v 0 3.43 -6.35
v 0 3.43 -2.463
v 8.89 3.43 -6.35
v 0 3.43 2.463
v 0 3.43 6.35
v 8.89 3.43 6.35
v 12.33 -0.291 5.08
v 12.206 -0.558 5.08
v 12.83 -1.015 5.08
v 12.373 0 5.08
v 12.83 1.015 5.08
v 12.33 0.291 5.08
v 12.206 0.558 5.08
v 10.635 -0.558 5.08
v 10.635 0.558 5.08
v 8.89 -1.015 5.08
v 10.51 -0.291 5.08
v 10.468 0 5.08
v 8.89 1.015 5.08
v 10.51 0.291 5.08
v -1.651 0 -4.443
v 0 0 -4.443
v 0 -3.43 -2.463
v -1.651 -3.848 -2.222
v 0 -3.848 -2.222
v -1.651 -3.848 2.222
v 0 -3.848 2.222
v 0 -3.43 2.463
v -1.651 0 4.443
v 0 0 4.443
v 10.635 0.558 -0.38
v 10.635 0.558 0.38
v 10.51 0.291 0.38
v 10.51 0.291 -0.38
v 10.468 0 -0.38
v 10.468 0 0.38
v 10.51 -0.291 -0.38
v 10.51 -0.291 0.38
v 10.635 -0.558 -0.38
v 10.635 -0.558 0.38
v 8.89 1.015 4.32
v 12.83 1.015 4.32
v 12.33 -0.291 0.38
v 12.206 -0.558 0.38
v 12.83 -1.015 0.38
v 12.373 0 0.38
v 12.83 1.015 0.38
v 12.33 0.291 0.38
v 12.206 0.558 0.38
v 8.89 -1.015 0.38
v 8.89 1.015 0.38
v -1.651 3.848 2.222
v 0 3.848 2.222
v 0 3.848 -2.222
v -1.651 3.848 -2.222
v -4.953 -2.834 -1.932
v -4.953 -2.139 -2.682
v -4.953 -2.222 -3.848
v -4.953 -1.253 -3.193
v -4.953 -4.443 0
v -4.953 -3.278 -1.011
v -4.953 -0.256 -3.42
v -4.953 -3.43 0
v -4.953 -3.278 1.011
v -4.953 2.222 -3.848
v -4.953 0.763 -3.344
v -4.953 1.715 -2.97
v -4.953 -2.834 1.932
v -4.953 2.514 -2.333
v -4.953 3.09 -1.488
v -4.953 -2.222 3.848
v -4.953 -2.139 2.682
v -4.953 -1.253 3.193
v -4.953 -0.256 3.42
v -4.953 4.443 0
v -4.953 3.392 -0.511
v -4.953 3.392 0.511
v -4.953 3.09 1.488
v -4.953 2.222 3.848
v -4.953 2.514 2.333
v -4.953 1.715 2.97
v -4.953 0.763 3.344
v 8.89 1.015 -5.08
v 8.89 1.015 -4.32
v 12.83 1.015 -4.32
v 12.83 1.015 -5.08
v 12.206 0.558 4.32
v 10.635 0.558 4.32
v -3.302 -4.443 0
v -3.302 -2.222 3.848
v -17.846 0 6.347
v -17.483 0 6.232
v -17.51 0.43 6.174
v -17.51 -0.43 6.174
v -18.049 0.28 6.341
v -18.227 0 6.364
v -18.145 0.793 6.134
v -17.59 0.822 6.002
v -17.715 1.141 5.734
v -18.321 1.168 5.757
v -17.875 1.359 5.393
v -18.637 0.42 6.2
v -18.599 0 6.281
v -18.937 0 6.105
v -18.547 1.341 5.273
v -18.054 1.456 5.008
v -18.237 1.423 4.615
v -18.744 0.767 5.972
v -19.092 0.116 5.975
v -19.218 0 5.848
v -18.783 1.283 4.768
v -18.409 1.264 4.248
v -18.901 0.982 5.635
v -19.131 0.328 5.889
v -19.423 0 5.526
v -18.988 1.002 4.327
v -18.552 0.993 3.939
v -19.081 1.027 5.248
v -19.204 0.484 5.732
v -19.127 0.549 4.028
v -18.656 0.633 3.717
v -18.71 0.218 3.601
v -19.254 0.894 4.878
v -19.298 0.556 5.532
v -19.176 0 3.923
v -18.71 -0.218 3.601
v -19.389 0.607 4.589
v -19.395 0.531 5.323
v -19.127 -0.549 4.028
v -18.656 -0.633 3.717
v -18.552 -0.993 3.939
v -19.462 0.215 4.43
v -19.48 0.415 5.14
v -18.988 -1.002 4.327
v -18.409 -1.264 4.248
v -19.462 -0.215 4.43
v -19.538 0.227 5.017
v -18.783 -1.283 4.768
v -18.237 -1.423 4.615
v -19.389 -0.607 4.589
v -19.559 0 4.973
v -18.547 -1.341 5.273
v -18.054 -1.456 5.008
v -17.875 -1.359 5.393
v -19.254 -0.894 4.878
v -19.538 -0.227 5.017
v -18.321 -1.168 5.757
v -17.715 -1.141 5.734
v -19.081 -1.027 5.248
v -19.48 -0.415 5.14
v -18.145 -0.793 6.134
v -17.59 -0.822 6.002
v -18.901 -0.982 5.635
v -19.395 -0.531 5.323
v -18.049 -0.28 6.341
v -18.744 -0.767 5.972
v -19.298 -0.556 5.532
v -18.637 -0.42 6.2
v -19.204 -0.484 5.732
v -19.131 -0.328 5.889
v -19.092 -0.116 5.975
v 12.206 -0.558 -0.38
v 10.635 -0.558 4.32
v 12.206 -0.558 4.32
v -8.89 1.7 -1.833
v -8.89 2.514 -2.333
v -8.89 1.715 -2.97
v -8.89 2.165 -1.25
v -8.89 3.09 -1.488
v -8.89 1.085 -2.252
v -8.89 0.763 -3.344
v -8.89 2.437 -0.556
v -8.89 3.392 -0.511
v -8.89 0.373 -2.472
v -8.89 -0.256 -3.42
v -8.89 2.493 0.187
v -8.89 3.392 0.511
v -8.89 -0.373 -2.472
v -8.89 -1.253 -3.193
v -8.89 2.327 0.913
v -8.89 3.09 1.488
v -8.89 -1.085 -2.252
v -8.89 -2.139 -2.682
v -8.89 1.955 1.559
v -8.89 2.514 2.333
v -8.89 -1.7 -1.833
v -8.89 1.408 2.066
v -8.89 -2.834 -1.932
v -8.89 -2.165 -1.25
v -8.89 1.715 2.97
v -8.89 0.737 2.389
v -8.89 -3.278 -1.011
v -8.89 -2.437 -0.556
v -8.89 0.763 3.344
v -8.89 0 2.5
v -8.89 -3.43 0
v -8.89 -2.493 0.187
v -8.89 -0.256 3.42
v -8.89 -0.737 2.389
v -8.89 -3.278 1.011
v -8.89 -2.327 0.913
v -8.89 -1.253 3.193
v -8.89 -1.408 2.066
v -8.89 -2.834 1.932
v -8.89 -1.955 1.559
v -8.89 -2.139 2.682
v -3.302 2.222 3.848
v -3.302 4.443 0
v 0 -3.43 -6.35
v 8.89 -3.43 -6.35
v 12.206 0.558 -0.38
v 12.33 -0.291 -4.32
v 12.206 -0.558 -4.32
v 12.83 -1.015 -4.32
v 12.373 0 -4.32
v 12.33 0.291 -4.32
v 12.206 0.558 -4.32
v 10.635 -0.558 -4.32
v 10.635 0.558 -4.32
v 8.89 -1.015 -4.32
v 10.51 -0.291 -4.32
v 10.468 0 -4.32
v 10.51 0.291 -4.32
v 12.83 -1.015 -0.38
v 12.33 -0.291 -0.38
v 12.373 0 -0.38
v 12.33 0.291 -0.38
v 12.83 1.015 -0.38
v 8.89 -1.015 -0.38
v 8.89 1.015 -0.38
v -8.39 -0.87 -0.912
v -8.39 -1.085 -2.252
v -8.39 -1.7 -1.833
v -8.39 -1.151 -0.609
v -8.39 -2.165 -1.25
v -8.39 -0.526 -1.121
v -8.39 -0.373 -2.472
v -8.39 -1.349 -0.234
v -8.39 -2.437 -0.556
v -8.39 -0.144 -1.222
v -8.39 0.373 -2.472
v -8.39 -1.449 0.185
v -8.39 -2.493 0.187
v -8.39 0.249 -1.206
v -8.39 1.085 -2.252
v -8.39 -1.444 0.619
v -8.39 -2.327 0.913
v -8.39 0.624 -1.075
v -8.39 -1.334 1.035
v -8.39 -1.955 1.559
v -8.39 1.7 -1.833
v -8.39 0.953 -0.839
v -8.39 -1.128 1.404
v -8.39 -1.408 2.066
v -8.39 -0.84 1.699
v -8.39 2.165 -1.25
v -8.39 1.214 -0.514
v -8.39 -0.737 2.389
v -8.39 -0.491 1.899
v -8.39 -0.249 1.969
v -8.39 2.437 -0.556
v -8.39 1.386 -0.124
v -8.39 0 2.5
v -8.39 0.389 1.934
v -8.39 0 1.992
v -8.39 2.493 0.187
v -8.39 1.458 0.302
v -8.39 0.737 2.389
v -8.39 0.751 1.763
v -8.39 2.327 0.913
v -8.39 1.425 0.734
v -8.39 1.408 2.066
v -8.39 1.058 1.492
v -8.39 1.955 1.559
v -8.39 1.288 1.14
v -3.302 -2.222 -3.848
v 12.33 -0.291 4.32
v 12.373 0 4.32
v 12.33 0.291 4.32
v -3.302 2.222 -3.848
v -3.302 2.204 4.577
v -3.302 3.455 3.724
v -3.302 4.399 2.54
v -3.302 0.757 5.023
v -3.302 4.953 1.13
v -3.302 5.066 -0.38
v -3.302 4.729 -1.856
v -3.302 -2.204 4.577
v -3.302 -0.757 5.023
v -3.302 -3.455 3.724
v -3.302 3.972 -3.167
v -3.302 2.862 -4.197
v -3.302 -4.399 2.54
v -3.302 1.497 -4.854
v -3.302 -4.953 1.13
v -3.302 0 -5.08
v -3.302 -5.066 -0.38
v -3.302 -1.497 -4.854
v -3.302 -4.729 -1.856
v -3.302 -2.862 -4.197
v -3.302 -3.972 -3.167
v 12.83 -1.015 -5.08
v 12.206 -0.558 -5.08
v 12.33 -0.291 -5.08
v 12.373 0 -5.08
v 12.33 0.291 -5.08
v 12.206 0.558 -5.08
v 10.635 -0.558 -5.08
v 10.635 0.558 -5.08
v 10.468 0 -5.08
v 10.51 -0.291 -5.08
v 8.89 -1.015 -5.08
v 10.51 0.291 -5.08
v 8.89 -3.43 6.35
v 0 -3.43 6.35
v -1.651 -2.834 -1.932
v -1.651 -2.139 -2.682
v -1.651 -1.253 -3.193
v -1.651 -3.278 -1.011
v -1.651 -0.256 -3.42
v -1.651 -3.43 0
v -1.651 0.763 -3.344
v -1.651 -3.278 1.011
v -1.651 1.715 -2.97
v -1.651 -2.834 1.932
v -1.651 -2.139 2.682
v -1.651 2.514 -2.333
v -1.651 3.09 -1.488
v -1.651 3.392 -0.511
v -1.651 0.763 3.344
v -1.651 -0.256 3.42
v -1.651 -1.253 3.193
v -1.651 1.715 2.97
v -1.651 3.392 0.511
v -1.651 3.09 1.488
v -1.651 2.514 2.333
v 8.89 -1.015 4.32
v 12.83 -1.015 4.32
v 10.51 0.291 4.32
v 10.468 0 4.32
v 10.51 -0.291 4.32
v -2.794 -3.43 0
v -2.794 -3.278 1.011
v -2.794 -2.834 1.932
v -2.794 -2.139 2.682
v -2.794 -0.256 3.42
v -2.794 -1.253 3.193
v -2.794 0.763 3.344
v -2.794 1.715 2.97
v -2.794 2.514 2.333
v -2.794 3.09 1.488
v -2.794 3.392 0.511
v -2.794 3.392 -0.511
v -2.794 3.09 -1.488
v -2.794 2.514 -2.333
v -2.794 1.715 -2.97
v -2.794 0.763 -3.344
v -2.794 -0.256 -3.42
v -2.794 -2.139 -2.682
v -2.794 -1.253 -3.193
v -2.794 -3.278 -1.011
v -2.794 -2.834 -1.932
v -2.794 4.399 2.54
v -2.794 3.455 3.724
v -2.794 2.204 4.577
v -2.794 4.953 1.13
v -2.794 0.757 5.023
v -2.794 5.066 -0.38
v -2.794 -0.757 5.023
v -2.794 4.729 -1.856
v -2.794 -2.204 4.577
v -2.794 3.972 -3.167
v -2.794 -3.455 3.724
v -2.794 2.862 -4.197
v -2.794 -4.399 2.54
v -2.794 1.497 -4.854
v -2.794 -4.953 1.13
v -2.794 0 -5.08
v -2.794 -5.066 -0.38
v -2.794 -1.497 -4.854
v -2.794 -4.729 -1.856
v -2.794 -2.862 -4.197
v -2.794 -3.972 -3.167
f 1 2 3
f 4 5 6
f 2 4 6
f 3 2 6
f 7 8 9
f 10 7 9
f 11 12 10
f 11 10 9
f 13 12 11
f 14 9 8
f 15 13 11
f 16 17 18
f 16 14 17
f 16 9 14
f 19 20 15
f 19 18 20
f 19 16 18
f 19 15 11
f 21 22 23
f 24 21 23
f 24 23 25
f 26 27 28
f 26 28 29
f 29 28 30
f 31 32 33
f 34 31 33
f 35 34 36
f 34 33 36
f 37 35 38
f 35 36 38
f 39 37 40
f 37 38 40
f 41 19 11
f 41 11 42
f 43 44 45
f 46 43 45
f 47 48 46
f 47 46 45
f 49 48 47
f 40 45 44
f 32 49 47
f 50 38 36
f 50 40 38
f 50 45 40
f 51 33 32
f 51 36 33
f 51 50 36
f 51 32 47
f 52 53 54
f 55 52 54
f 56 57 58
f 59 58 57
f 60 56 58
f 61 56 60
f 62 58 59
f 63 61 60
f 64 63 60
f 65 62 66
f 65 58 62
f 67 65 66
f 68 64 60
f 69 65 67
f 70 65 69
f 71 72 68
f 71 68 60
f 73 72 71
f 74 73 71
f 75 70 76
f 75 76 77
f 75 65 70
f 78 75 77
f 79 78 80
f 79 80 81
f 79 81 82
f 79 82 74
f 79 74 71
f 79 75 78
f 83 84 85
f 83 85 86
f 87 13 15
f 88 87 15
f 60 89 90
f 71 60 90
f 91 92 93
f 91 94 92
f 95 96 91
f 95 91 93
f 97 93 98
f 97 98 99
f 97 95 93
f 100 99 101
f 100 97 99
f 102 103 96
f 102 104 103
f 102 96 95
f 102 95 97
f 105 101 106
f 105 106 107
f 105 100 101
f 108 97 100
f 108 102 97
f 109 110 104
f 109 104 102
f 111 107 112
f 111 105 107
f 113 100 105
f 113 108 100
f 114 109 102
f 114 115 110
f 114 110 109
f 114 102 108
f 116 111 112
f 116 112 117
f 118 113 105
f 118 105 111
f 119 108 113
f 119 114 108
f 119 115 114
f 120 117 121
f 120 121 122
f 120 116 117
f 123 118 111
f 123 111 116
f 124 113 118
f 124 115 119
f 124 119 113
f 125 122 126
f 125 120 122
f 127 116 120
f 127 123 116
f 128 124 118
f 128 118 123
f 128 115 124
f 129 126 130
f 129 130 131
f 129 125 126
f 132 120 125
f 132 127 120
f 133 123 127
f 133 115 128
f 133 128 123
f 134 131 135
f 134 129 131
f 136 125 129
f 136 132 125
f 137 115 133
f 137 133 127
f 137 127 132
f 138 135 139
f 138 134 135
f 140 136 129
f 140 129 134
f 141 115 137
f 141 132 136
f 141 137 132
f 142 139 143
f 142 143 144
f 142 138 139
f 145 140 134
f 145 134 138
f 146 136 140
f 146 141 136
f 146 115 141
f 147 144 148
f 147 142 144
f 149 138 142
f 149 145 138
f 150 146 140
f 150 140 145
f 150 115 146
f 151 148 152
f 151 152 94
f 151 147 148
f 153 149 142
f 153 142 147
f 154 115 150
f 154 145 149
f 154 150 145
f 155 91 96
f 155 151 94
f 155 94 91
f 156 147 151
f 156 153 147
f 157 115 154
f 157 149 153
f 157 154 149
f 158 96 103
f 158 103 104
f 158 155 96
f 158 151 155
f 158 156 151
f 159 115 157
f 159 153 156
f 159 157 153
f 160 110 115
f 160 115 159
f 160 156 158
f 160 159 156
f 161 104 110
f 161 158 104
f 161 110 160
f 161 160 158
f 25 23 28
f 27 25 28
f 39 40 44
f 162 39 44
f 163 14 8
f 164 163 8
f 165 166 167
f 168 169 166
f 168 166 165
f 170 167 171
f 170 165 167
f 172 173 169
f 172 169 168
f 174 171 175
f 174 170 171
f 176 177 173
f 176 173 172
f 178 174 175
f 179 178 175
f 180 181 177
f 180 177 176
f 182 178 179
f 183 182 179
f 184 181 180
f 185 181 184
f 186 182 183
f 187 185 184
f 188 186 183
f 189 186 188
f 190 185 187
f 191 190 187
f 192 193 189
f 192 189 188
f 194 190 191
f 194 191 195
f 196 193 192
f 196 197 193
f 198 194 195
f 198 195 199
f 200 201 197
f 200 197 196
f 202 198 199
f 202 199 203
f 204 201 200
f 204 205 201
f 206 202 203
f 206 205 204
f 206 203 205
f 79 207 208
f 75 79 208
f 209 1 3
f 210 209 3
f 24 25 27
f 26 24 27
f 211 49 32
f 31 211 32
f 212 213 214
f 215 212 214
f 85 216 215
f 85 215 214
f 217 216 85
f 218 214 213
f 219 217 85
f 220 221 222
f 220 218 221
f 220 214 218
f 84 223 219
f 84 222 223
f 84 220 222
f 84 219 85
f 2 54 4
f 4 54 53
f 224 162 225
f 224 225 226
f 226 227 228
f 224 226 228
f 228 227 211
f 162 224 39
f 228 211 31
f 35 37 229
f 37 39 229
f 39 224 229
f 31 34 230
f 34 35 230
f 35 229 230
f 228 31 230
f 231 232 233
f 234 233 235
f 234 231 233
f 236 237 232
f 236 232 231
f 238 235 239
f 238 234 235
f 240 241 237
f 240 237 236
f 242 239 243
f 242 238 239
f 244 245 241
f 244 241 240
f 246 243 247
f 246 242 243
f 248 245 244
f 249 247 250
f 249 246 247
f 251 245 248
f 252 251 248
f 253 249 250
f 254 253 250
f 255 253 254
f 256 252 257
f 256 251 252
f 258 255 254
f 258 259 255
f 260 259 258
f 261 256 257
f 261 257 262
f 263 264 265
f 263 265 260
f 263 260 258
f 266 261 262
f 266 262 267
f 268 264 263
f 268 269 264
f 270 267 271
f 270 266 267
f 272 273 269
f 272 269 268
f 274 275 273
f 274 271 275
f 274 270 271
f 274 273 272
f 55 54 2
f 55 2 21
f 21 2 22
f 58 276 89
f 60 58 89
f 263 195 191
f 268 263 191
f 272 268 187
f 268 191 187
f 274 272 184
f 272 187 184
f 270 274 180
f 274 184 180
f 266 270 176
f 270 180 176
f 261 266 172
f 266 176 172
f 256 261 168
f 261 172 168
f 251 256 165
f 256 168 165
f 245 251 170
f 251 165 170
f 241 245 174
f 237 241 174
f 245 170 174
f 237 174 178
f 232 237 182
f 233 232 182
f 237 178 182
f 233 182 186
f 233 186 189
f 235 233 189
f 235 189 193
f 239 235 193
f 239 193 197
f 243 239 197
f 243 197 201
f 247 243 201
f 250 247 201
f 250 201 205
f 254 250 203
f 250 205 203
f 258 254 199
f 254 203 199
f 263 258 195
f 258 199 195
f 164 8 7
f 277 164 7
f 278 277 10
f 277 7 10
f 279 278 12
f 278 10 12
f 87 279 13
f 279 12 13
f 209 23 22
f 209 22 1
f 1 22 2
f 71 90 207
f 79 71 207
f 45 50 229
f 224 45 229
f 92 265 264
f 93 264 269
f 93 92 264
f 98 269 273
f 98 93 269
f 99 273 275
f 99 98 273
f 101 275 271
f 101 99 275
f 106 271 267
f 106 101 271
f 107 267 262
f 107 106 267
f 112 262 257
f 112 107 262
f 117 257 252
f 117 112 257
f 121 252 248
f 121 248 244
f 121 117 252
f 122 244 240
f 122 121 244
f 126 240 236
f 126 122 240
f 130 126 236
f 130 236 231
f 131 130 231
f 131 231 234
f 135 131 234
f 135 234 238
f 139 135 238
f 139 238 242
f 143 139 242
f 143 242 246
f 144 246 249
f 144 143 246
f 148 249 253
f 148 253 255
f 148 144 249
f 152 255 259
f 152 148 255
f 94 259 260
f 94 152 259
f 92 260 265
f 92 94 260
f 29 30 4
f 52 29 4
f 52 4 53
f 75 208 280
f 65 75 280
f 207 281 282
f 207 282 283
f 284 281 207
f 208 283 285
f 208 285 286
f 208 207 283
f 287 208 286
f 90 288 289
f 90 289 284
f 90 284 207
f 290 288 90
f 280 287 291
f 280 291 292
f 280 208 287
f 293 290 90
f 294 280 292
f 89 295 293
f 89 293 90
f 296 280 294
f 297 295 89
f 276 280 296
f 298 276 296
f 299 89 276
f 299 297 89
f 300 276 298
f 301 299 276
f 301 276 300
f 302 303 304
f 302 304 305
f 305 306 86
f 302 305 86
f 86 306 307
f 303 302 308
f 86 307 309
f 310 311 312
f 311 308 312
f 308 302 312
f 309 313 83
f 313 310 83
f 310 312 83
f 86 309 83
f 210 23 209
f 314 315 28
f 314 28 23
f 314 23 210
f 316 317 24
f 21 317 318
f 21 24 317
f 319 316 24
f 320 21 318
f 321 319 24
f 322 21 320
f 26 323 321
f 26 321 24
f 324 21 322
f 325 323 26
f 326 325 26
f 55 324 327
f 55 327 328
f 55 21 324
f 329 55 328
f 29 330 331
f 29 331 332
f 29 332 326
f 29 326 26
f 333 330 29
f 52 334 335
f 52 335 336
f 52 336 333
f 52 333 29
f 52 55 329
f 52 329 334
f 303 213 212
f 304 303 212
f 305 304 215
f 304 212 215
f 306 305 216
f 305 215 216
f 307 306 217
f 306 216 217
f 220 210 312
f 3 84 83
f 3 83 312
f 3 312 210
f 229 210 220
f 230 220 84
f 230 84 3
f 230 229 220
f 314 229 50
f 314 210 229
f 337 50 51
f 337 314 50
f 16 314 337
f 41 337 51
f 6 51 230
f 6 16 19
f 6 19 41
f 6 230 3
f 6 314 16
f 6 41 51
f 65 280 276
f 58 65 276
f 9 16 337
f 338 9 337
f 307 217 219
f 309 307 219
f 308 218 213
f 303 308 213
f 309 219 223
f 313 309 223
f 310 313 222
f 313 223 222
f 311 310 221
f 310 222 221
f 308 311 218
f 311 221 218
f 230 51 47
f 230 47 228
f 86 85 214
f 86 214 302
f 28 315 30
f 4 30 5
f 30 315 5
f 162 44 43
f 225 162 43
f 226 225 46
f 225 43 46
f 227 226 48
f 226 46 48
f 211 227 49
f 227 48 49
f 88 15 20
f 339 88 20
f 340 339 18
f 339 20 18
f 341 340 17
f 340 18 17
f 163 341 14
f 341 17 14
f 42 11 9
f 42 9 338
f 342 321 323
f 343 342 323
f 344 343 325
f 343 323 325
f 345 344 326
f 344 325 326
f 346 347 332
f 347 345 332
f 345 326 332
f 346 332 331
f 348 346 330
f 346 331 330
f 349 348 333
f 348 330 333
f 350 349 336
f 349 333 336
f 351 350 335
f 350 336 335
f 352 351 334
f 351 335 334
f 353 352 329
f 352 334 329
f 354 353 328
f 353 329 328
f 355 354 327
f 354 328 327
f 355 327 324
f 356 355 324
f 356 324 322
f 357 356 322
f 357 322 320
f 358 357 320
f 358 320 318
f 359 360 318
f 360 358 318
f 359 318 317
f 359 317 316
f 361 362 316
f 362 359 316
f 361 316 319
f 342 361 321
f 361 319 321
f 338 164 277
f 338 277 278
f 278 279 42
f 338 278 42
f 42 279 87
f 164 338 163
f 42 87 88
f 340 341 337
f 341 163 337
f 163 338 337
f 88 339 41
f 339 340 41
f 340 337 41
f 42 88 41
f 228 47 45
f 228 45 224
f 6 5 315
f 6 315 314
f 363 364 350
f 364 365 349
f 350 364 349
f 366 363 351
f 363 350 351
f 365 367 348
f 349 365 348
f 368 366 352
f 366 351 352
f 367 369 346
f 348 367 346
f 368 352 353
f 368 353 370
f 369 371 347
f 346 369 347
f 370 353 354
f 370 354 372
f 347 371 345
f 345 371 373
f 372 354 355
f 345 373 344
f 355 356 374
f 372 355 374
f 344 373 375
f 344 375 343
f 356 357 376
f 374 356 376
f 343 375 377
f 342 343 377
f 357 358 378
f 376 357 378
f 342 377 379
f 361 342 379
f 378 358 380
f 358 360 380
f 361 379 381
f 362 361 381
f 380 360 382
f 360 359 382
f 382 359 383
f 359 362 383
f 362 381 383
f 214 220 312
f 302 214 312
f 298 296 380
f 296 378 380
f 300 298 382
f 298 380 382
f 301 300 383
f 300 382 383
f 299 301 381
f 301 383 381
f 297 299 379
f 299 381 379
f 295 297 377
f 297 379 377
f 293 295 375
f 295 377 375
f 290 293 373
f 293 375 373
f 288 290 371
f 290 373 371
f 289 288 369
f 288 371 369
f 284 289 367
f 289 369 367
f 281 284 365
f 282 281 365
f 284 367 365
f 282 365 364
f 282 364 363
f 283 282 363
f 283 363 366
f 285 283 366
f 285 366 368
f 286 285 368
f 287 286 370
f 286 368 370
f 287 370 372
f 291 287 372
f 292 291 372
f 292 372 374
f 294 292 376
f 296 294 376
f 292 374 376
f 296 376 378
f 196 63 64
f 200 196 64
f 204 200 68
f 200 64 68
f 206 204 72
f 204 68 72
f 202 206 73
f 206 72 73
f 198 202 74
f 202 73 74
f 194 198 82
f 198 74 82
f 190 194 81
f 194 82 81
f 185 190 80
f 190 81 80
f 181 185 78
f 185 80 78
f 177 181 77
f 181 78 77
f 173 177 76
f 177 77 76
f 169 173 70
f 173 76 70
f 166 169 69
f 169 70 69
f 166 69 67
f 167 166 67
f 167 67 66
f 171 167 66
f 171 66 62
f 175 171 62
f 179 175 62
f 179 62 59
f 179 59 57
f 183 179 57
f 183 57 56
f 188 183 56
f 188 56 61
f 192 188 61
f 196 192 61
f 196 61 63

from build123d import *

# Parameters (mm, degrees)
SKETCH1_W           = 8.89
SKETCH1_H           = 6.86
EXTRUDE1_DEPTH      = 6.35
SKETCH2_R           = 3.43
EXTRUDE2_DEPTH      = 8.89
SKETCH4_R           = 2.5
EXTRUDE3_DEPTH      = 0.5
SKETCH5_W           = 0.76
SKETCH5_H           = 2.03
EXTRUDE4_DEPTH      = 3.94
LPATTERN1_COUNT     = 3
LPATTERN1_PITCH     = 4.7
CUT_EXTRUDE1_DEPTH  = 23.912952669
BOSS_EXTRUDE1_DEPTH = 1.651
SKETCH8_W           = 0.508
SKETCH8_H           = 5.08
BOSS_EXTRUDE2_DEPTH = 1.651


with BuildPart() as part:
    # Sketch1 → Extrude1 (new, symmetric)
    with BuildSketch(Plane.XY):
        with Locations((4.445, 0)):
            Rectangle(SKETCH1_W, SKETCH1_H)
    extrude(amount=EXTRUDE1_DEPTH, both=True)

    # Sketch2 → Extrude2 (add)
    with BuildSketch(Plane.ZY):
        with Locations(Location((0, 0, 0), (0, 0, 270))):
            Circle(SKETCH2_R)
    extrude(amount=EXTRUDE2_DEPTH)

    # Sketch4 → Extrude3 (cut)
    with BuildSketch(Plane.ZY.offset(8.89)):
        Circle(SKETCH4_R)
    extrude(amount=-EXTRUDE3_DEPTH, mode=Mode.SUBTRACT)

    # Sketch3 → Revolve3 (revolve)
    with BuildSketch(Plane(origin=(0, 0, 0), x_dir=(1, 0, 0), z_dir=(0, 1, 0))):
        with BuildLine():
            Line((-6.5, 0.5), (-5.882977338, -0.823209369))
            Line((-5.882977338, -0.823209369), (-17.482977338, -6.232378204))
            ThreePointArc((-17.482977338, -6.232378204), (-18.599349409, -6.281120061), (-19.423209369, -5.526191497))
            Line((-19.423209369, -5.526191497), (-6.5, 0.5))
        make_face()
    revolve(axis=Axis((-8.89, 0, 0.614475303), (-0.9063077870366493, 0, 0.4226182617407009)))

    # Sketch5 → Extrude4 (add)
    with BuildSketch(Plane(origin=(8.89, 0, 0), x_dir=(0, 0, -1), z_dir=(1, 0, 0))):
        with Locations((-4.7, 0)):
            Rectangle(SKETCH5_W, SKETCH5_H)
    extrude4 = extrude(amount=EXTRUDE4_DEPTH)

    # LPattern1: Extrude4 ×3
    with Locations(*[(0, 0, -i * LPATTERN1_PITCH) for i in range(1, LPATTERN1_COUNT)]):
        add(extrude4)

    # Sketch6 → Cut-Extrude1 (cut, through all)
    with BuildSketch(Plane.XY.offset(5.08)):
        with BuildLine():
            Line((12.205788302, 0.5578), (10.634811698, 0.5578))
            ThreePointArc((10.634811698, 0.5578), (10.4678, 0), (10.634811698, -0.5578))
            Line((10.634811698, -0.5578), (12.205788302, -0.5578))
            ThreePointArc((12.205788302, -0.5578), (12.3728, 0), (12.205788302, 0.5578))
        make_face()
    extrude(amount=-CUT_EXTRUDE1_DEPTH, mode=Mode.SUBTRACT)

    # Sketch7 → Boss-Extrude1 (add)
    with BuildSketch(Plane.ZY):
        Polygon((-4.443403142, 0), (-2.221701571, -3.8481), (2.221701571, -3.8481), (4.443403142, 0), (2.221701571, 3.8481), (-2.221701571, 3.8481), align=None)
    extrude(amount=BOSS_EXTRUDE1_DEPTH)

    # Sketch8 → Revolve4 (revolve)
    with BuildSketch(Plane(origin=(0, 0, 0), x_dir=(1, 0, 0), z_dir=(0, 1, 0)), mode=Mode.PRIVATE) as revolve4_sk:
        with Locations((-3.048, -2.54)):
            Rectangle(SKETCH8_W, SKETCH8_H)
    revolve(revolve4_sk.sketch.rotate(Axis((-2.794, 0, 0), (-1, 0, 0)), 180), axis=Axis((-2.794, 0, 0), (-1, 0, 0)))

    # Sketch9 → Boss-Extrude2 (add)
    with BuildSketch(Plane.ZY.offset(3.302)):
        Polygon((0, 4.443403142), (-3.8481, 2.221701571), (-3.8481, -2.221701571), (0, -4.443403142), (3.8481, -2.221701571), (3.8481, 2.221701571), align=None)
    extrude(amount=BOSS_EXTRUDE2_DEPTH)


solid = part.part
